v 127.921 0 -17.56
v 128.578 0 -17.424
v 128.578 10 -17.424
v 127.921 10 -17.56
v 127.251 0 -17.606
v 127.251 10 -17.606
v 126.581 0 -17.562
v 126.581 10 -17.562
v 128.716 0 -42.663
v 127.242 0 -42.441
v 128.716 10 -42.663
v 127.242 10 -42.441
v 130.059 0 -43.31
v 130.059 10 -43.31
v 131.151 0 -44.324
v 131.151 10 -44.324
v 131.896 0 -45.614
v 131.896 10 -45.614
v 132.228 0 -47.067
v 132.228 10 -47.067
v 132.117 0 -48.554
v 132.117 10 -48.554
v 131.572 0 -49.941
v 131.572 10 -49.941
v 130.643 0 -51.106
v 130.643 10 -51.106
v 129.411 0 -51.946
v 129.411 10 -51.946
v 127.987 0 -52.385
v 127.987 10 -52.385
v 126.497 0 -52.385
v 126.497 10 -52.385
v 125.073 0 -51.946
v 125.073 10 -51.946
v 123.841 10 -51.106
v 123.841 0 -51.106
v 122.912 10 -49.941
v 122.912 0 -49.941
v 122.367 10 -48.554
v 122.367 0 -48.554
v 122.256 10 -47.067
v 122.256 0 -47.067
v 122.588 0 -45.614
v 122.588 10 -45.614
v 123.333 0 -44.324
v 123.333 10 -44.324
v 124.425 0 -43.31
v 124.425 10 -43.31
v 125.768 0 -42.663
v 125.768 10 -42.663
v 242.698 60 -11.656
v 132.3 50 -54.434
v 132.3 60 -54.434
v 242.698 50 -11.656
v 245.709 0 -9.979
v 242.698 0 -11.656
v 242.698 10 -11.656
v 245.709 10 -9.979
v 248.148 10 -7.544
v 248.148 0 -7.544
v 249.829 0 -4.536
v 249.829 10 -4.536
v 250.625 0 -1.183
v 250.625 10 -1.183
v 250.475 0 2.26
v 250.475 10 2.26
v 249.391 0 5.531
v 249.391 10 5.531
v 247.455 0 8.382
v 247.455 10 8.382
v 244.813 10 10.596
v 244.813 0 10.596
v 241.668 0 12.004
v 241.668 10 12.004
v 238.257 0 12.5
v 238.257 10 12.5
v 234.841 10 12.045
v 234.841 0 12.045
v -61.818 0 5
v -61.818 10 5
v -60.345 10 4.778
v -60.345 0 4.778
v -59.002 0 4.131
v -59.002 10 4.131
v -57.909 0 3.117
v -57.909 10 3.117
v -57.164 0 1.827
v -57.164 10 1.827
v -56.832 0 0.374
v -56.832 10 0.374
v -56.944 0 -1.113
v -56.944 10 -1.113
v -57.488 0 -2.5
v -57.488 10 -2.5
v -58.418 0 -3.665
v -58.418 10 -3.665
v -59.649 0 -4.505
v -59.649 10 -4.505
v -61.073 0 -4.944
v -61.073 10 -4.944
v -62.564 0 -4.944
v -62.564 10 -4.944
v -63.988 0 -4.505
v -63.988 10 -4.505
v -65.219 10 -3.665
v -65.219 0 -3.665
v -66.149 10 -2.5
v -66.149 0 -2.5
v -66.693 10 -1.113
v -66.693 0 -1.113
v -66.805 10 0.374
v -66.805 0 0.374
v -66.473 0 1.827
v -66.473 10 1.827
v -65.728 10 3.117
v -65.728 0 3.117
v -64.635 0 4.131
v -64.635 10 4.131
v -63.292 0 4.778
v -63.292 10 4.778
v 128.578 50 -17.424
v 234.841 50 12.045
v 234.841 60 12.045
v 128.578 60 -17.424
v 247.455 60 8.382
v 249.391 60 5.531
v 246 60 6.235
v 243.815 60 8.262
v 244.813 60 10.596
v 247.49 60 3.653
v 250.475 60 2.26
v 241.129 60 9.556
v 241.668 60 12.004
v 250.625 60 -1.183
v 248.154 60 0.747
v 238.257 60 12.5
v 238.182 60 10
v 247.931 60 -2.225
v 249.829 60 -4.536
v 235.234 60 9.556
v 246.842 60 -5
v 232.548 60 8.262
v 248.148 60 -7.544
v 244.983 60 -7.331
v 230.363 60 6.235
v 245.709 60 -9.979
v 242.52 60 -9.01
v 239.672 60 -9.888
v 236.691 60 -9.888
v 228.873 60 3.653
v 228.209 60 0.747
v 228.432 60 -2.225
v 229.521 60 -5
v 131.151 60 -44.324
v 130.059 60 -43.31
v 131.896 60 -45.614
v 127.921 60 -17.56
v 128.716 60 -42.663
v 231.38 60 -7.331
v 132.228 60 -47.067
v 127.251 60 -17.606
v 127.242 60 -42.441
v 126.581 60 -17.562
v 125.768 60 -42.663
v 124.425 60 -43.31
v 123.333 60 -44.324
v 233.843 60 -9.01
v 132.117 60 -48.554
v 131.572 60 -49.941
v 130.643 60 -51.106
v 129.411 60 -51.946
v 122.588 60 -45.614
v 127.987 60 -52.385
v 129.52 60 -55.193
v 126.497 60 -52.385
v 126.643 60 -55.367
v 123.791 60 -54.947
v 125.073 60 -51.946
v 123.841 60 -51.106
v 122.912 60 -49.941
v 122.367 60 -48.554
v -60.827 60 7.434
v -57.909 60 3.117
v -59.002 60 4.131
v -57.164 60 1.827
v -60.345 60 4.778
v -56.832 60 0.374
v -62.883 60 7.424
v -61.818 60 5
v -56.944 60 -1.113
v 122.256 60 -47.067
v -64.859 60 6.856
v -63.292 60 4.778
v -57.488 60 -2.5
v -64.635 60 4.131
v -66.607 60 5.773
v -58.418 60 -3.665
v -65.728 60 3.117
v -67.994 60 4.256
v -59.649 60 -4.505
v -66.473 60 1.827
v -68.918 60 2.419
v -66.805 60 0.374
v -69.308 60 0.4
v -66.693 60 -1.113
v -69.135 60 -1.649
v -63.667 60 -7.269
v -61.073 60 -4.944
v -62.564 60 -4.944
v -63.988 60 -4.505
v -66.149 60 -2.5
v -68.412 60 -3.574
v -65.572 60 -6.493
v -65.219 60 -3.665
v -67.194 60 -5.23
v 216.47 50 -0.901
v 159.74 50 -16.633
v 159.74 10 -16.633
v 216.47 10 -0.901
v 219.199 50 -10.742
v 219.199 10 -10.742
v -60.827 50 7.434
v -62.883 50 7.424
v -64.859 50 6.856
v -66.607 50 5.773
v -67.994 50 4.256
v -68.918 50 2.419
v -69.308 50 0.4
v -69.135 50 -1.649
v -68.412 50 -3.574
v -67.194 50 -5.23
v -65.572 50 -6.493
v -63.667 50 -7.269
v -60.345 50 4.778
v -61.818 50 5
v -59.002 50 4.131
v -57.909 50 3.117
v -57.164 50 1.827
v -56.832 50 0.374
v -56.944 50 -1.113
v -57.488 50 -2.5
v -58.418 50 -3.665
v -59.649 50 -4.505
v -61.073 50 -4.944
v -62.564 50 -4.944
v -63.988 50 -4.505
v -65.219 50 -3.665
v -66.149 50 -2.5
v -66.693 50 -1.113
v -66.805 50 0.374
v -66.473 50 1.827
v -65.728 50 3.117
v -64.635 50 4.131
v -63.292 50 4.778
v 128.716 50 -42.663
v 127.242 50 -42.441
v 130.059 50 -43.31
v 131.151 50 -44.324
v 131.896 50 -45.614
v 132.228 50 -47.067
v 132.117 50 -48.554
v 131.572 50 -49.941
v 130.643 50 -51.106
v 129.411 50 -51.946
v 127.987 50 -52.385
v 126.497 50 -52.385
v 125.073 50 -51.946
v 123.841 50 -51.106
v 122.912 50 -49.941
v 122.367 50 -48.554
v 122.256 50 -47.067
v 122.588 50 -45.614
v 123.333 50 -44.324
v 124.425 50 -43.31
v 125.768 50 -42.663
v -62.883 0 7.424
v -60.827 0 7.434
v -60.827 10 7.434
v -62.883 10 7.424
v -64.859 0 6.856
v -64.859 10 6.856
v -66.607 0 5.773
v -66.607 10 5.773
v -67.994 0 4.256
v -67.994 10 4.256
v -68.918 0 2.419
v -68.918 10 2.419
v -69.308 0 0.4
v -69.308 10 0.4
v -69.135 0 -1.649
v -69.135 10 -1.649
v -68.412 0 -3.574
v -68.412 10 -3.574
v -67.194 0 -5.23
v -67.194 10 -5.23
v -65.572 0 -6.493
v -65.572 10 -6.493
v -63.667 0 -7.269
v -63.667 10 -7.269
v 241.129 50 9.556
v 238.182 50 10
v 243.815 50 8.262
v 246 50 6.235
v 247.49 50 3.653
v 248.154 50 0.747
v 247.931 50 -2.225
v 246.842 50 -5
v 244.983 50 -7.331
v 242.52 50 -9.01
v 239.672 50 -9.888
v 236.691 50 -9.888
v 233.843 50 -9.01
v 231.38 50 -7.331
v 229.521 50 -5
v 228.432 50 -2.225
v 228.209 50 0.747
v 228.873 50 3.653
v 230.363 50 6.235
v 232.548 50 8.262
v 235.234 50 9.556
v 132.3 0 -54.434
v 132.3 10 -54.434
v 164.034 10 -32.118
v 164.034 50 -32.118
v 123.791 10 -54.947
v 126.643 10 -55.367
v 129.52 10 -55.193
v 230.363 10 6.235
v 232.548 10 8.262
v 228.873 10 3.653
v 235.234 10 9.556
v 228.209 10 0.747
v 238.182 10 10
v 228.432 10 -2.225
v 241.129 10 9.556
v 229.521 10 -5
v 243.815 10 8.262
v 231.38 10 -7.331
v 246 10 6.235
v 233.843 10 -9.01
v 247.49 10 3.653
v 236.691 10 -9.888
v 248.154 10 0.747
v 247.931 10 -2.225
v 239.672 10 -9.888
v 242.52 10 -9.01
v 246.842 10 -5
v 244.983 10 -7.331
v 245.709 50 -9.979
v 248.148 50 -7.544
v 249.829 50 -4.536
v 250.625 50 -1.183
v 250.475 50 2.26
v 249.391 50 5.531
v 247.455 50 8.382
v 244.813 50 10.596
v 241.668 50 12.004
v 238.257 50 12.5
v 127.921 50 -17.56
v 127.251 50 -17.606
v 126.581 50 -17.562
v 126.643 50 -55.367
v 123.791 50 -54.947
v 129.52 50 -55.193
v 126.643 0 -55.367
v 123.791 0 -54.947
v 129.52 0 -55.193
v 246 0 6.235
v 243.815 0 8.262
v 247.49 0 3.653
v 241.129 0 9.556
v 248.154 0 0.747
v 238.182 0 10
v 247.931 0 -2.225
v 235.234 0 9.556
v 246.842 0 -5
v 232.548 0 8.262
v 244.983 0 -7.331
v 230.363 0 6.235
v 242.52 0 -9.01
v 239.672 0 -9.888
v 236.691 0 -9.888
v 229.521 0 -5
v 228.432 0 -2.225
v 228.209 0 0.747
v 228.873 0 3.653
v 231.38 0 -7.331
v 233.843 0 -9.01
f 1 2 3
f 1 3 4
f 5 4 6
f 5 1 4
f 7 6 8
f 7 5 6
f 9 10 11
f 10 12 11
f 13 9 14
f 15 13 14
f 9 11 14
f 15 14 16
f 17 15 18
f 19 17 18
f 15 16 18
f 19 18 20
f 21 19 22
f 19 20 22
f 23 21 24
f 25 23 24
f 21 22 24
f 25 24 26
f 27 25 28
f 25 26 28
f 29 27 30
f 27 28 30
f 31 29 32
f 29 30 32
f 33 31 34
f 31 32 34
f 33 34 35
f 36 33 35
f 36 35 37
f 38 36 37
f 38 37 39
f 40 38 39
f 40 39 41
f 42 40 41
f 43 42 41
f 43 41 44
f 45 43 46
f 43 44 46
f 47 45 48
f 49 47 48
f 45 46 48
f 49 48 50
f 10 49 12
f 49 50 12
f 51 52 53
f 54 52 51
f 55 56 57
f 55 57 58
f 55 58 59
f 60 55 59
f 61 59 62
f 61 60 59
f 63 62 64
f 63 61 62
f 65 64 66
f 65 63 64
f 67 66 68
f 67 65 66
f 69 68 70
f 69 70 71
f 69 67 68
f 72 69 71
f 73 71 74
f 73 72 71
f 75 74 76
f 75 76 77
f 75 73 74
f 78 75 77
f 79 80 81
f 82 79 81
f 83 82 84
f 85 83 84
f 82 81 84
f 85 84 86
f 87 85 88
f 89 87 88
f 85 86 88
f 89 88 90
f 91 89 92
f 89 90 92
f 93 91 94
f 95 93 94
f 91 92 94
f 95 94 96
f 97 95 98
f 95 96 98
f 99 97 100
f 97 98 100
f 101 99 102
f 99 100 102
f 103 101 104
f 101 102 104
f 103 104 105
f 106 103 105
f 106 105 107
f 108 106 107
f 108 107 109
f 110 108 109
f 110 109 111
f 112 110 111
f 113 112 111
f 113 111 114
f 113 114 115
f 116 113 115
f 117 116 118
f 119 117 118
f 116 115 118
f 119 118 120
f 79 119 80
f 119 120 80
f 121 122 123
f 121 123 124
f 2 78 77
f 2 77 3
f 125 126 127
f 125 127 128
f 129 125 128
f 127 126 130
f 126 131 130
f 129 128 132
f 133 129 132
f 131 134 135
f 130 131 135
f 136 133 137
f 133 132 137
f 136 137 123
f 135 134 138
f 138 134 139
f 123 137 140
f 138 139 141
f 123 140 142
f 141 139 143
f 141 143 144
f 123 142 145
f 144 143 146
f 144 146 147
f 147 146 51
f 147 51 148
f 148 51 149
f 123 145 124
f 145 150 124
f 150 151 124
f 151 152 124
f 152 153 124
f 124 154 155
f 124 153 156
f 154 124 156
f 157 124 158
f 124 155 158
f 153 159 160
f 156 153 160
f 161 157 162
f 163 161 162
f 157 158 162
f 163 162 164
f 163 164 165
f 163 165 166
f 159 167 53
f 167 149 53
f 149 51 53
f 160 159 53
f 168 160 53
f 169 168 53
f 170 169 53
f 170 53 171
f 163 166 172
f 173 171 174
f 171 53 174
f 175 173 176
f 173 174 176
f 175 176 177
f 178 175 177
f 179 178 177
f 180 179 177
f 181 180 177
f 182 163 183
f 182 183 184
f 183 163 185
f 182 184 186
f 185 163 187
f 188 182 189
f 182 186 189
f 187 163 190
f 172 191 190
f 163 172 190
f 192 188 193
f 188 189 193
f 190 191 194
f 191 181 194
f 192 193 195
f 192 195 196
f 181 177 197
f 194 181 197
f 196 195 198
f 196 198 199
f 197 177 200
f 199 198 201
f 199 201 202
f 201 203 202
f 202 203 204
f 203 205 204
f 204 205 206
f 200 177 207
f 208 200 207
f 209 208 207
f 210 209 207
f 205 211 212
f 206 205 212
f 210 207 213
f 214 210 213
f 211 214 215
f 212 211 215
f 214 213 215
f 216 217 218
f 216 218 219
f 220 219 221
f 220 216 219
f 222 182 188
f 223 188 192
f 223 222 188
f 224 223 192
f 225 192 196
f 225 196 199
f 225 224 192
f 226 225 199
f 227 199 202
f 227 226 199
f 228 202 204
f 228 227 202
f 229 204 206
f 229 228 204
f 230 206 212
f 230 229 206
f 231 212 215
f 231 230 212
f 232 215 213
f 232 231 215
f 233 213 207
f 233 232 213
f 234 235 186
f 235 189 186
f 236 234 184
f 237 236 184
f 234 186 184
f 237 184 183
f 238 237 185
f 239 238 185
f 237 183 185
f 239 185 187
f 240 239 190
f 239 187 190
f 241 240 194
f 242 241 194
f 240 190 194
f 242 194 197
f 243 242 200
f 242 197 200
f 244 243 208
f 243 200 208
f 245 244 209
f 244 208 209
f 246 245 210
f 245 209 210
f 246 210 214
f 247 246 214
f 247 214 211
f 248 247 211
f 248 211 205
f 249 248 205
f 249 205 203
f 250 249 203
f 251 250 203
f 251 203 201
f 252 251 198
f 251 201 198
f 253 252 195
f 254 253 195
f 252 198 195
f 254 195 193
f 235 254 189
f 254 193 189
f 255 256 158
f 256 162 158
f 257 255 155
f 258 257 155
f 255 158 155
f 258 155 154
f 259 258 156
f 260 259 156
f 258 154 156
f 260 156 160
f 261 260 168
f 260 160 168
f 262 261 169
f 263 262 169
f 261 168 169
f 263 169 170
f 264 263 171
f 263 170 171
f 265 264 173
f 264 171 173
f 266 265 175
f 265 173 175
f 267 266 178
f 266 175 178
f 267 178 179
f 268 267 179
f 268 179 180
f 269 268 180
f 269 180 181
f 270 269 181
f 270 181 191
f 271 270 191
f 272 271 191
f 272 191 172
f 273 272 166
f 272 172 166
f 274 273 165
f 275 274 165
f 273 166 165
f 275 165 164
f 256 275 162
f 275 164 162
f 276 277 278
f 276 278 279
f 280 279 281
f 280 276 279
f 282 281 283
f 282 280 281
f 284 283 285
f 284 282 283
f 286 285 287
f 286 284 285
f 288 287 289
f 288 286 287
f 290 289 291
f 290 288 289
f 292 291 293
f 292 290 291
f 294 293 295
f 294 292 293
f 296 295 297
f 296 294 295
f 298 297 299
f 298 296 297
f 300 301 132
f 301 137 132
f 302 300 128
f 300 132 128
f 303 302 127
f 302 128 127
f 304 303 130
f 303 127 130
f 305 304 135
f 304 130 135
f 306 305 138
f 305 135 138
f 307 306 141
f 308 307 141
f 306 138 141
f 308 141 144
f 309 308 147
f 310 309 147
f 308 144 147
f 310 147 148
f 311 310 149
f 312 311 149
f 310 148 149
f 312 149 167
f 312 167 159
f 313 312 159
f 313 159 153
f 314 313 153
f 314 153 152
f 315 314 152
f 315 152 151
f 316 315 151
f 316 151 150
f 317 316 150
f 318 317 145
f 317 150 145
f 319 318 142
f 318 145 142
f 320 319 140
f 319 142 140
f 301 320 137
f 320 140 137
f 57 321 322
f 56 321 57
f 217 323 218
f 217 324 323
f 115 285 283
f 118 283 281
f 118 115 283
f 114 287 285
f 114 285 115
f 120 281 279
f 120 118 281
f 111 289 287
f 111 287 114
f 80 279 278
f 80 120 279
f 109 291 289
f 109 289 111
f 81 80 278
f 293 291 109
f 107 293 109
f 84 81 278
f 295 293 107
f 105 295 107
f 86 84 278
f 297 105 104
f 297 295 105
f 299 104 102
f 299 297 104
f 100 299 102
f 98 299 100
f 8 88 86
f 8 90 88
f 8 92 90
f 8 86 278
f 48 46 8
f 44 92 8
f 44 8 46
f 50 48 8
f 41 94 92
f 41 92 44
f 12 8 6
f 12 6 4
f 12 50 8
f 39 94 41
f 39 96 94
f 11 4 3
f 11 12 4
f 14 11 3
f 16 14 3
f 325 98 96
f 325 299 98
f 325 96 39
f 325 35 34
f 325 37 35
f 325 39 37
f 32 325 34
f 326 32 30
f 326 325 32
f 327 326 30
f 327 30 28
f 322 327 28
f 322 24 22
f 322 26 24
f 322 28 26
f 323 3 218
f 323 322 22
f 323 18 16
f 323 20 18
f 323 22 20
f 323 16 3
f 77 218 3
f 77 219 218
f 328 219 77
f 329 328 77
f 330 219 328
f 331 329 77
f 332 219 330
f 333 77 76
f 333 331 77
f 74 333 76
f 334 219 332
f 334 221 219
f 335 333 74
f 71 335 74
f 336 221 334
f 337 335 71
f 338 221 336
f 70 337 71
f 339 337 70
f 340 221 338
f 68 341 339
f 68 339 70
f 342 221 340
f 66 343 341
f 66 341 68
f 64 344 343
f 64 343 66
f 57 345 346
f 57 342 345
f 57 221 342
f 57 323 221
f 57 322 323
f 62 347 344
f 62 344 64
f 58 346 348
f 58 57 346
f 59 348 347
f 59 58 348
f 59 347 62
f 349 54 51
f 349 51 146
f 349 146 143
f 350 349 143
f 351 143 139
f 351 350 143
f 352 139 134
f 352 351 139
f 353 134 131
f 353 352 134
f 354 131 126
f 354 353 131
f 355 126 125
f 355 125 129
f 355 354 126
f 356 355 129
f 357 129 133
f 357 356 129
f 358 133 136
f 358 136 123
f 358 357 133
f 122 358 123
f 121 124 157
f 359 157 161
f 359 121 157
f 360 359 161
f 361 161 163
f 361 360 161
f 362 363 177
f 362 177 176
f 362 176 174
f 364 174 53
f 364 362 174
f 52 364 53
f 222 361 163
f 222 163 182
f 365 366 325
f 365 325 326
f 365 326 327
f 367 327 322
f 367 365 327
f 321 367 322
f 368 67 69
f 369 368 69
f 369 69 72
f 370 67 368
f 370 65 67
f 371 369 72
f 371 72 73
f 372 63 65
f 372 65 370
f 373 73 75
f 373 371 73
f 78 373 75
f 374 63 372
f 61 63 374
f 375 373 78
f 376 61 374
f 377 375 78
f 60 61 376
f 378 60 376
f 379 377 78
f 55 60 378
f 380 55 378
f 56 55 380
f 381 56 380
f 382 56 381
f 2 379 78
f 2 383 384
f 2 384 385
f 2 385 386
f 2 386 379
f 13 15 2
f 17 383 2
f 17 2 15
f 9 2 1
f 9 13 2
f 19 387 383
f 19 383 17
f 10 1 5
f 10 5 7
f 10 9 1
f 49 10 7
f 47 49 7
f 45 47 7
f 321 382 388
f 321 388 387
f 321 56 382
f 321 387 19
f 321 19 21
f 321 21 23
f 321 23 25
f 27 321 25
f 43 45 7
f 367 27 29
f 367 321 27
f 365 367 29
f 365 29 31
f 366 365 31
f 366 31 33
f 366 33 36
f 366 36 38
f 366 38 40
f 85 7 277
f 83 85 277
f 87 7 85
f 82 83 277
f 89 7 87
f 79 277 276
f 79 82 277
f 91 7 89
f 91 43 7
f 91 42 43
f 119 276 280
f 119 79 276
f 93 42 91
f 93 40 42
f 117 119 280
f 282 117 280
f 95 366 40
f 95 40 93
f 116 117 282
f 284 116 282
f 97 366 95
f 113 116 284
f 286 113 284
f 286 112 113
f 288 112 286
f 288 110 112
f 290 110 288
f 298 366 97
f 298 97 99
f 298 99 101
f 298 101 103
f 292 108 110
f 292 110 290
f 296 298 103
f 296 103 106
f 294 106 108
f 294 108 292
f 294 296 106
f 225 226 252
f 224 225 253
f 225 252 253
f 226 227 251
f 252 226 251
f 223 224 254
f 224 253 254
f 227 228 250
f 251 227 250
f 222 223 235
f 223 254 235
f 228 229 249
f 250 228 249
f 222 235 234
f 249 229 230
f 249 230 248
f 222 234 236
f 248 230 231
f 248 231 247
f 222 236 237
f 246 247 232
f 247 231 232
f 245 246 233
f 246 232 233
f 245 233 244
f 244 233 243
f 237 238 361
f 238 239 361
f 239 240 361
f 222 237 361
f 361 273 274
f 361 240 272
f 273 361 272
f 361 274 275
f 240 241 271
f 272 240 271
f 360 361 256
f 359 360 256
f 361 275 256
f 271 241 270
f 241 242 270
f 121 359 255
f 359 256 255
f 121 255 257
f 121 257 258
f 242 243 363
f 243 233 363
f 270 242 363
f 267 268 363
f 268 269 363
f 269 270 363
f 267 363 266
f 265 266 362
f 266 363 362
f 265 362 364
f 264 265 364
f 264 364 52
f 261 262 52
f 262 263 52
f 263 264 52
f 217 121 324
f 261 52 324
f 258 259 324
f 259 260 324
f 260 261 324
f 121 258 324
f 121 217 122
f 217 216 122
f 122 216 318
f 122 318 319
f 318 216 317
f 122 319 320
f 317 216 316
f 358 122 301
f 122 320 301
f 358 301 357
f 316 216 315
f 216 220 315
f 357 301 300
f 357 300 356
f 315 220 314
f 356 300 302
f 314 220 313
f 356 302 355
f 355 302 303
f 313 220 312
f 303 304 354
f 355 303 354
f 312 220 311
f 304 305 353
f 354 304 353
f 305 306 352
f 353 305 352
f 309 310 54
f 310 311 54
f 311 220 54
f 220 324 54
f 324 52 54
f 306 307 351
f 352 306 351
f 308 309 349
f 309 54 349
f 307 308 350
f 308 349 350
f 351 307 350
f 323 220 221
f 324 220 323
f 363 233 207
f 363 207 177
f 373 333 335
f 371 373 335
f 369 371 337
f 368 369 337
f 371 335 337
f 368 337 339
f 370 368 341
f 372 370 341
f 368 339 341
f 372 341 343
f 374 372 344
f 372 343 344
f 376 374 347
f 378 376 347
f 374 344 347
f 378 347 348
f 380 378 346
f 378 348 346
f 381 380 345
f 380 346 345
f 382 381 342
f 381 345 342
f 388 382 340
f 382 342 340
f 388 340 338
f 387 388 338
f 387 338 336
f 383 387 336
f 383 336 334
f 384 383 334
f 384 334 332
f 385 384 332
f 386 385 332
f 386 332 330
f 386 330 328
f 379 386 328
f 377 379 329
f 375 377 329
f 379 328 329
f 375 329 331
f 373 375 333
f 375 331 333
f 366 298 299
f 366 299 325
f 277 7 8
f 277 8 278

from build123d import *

# Parameters (mm, degrees)
BOSS_EXTRUDE3_DEPTH = 60
SKETCH4_R           = 10
SKETCH4_R_2         = 5
CUT_EXTRUDE2_DEPTH  = 98.5
SKETCH5_W           = 377.10594696
SKETCH5_H           = 125.451579965
CUT_EXTRUDE3_DEPTH  = 20
SKETCH6_R           = 5
CUT_EXTRUDE4_DEPTH  = 40.5


with BuildPart() as part:
    # Sketch1 → Boss-Extrude3 (new body)
    with BuildSketch(Plane(origin=(0, 0, 0), x_dir=(1, 0, 0), z_dir=(0, 1, 0))):
        with BuildLine():
            Line((-63.667210577, 7.268578883), (123.791080386, 54.947452974))
            ThreePointArc((123.791080386, 54.947452974), (128.085809082, 55.353988191), (132.30042121, 54.43365669))
            Line((132.30042121, 54.43365669), (242.697935991, 11.655551457))
            ThreePointArc((242.697935991, 11.655551457), (250.046544834, -3.933307136), (234.840986043, -12.045368899))
            Line((234.840986043, -12.045368899), (128.578230905, 17.424304308))
            ThreePointArc((128.578230905, 17.424304308), (127.586579666, 17.594270625), (126.58097714, 17.562266071))
            Line((126.58097714, 17.562266071), (-60.826924457, -7.434163985))
            ThreePointArc((-60.826924457, -7.434163985), (-69.182345376, -1.422554364), (-63.667210577, 7.268578883))
        make_face()
    extrude(amount=BOSS_EXTRUDE3_DEPTH)

    # Sketch4 → Cut-Extrude2 (cut, symmetric)
    with BuildSketch(Plane(origin=(0, 30, 0), x_dir=(1, 0, 0), z_dir=(0, 1, 0))):
        with Locations(Location((238.181508173, 0, 0), (0, 0, 270))):
            Circle(SKETCH4_R)
        with Locations(Location((-61.818491827, 0, 0), (0, 0, 270))):
            Circle(SKETCH4_R_2)
    extrude(amount=CUT_EXTRUDE2_DEPTH, both=True, mode=Mode.SUBTRACT)

    # Sketch5 → Cut-Extrude3 (cut, symmetric)
    with BuildSketch(Plane(origin=(0, 30, 0), x_dir=(1, 0, 0), z_dir=(0, 1, 0))):
        with Locations((90.046698809, 24.704131579)):
            Rectangle(SKETCH5_W, SKETCH5_H)
        Polygon((159.740207612, 16.633427142), (216.469846148, 0.900690808), (219.199055149, 10.741765928), (164.034407851, 32.117601172), align=None, mode=Mode.SUBTRACT)
    extrude(amount=CUT_EXTRUDE3_DEPTH, both=True, mode=Mode.SUBTRACT)

    # Sketch6 → Cut-Extrude4 (cut, symmetric)
    with BuildSketch(Plane(origin=(0, 30, 0), x_dir=(1, 0, 0), z_dir=(0, 1, 0))):
        with Locations(Location((127.242022054, 47.44112623, 0), (0, 0, 270))):
            Circle(SKETCH6_R)
    extrude(amount=CUT_EXTRUDE4_DEPTH, both=True, mode=Mode.SUBTRACT)


solid = part.part
